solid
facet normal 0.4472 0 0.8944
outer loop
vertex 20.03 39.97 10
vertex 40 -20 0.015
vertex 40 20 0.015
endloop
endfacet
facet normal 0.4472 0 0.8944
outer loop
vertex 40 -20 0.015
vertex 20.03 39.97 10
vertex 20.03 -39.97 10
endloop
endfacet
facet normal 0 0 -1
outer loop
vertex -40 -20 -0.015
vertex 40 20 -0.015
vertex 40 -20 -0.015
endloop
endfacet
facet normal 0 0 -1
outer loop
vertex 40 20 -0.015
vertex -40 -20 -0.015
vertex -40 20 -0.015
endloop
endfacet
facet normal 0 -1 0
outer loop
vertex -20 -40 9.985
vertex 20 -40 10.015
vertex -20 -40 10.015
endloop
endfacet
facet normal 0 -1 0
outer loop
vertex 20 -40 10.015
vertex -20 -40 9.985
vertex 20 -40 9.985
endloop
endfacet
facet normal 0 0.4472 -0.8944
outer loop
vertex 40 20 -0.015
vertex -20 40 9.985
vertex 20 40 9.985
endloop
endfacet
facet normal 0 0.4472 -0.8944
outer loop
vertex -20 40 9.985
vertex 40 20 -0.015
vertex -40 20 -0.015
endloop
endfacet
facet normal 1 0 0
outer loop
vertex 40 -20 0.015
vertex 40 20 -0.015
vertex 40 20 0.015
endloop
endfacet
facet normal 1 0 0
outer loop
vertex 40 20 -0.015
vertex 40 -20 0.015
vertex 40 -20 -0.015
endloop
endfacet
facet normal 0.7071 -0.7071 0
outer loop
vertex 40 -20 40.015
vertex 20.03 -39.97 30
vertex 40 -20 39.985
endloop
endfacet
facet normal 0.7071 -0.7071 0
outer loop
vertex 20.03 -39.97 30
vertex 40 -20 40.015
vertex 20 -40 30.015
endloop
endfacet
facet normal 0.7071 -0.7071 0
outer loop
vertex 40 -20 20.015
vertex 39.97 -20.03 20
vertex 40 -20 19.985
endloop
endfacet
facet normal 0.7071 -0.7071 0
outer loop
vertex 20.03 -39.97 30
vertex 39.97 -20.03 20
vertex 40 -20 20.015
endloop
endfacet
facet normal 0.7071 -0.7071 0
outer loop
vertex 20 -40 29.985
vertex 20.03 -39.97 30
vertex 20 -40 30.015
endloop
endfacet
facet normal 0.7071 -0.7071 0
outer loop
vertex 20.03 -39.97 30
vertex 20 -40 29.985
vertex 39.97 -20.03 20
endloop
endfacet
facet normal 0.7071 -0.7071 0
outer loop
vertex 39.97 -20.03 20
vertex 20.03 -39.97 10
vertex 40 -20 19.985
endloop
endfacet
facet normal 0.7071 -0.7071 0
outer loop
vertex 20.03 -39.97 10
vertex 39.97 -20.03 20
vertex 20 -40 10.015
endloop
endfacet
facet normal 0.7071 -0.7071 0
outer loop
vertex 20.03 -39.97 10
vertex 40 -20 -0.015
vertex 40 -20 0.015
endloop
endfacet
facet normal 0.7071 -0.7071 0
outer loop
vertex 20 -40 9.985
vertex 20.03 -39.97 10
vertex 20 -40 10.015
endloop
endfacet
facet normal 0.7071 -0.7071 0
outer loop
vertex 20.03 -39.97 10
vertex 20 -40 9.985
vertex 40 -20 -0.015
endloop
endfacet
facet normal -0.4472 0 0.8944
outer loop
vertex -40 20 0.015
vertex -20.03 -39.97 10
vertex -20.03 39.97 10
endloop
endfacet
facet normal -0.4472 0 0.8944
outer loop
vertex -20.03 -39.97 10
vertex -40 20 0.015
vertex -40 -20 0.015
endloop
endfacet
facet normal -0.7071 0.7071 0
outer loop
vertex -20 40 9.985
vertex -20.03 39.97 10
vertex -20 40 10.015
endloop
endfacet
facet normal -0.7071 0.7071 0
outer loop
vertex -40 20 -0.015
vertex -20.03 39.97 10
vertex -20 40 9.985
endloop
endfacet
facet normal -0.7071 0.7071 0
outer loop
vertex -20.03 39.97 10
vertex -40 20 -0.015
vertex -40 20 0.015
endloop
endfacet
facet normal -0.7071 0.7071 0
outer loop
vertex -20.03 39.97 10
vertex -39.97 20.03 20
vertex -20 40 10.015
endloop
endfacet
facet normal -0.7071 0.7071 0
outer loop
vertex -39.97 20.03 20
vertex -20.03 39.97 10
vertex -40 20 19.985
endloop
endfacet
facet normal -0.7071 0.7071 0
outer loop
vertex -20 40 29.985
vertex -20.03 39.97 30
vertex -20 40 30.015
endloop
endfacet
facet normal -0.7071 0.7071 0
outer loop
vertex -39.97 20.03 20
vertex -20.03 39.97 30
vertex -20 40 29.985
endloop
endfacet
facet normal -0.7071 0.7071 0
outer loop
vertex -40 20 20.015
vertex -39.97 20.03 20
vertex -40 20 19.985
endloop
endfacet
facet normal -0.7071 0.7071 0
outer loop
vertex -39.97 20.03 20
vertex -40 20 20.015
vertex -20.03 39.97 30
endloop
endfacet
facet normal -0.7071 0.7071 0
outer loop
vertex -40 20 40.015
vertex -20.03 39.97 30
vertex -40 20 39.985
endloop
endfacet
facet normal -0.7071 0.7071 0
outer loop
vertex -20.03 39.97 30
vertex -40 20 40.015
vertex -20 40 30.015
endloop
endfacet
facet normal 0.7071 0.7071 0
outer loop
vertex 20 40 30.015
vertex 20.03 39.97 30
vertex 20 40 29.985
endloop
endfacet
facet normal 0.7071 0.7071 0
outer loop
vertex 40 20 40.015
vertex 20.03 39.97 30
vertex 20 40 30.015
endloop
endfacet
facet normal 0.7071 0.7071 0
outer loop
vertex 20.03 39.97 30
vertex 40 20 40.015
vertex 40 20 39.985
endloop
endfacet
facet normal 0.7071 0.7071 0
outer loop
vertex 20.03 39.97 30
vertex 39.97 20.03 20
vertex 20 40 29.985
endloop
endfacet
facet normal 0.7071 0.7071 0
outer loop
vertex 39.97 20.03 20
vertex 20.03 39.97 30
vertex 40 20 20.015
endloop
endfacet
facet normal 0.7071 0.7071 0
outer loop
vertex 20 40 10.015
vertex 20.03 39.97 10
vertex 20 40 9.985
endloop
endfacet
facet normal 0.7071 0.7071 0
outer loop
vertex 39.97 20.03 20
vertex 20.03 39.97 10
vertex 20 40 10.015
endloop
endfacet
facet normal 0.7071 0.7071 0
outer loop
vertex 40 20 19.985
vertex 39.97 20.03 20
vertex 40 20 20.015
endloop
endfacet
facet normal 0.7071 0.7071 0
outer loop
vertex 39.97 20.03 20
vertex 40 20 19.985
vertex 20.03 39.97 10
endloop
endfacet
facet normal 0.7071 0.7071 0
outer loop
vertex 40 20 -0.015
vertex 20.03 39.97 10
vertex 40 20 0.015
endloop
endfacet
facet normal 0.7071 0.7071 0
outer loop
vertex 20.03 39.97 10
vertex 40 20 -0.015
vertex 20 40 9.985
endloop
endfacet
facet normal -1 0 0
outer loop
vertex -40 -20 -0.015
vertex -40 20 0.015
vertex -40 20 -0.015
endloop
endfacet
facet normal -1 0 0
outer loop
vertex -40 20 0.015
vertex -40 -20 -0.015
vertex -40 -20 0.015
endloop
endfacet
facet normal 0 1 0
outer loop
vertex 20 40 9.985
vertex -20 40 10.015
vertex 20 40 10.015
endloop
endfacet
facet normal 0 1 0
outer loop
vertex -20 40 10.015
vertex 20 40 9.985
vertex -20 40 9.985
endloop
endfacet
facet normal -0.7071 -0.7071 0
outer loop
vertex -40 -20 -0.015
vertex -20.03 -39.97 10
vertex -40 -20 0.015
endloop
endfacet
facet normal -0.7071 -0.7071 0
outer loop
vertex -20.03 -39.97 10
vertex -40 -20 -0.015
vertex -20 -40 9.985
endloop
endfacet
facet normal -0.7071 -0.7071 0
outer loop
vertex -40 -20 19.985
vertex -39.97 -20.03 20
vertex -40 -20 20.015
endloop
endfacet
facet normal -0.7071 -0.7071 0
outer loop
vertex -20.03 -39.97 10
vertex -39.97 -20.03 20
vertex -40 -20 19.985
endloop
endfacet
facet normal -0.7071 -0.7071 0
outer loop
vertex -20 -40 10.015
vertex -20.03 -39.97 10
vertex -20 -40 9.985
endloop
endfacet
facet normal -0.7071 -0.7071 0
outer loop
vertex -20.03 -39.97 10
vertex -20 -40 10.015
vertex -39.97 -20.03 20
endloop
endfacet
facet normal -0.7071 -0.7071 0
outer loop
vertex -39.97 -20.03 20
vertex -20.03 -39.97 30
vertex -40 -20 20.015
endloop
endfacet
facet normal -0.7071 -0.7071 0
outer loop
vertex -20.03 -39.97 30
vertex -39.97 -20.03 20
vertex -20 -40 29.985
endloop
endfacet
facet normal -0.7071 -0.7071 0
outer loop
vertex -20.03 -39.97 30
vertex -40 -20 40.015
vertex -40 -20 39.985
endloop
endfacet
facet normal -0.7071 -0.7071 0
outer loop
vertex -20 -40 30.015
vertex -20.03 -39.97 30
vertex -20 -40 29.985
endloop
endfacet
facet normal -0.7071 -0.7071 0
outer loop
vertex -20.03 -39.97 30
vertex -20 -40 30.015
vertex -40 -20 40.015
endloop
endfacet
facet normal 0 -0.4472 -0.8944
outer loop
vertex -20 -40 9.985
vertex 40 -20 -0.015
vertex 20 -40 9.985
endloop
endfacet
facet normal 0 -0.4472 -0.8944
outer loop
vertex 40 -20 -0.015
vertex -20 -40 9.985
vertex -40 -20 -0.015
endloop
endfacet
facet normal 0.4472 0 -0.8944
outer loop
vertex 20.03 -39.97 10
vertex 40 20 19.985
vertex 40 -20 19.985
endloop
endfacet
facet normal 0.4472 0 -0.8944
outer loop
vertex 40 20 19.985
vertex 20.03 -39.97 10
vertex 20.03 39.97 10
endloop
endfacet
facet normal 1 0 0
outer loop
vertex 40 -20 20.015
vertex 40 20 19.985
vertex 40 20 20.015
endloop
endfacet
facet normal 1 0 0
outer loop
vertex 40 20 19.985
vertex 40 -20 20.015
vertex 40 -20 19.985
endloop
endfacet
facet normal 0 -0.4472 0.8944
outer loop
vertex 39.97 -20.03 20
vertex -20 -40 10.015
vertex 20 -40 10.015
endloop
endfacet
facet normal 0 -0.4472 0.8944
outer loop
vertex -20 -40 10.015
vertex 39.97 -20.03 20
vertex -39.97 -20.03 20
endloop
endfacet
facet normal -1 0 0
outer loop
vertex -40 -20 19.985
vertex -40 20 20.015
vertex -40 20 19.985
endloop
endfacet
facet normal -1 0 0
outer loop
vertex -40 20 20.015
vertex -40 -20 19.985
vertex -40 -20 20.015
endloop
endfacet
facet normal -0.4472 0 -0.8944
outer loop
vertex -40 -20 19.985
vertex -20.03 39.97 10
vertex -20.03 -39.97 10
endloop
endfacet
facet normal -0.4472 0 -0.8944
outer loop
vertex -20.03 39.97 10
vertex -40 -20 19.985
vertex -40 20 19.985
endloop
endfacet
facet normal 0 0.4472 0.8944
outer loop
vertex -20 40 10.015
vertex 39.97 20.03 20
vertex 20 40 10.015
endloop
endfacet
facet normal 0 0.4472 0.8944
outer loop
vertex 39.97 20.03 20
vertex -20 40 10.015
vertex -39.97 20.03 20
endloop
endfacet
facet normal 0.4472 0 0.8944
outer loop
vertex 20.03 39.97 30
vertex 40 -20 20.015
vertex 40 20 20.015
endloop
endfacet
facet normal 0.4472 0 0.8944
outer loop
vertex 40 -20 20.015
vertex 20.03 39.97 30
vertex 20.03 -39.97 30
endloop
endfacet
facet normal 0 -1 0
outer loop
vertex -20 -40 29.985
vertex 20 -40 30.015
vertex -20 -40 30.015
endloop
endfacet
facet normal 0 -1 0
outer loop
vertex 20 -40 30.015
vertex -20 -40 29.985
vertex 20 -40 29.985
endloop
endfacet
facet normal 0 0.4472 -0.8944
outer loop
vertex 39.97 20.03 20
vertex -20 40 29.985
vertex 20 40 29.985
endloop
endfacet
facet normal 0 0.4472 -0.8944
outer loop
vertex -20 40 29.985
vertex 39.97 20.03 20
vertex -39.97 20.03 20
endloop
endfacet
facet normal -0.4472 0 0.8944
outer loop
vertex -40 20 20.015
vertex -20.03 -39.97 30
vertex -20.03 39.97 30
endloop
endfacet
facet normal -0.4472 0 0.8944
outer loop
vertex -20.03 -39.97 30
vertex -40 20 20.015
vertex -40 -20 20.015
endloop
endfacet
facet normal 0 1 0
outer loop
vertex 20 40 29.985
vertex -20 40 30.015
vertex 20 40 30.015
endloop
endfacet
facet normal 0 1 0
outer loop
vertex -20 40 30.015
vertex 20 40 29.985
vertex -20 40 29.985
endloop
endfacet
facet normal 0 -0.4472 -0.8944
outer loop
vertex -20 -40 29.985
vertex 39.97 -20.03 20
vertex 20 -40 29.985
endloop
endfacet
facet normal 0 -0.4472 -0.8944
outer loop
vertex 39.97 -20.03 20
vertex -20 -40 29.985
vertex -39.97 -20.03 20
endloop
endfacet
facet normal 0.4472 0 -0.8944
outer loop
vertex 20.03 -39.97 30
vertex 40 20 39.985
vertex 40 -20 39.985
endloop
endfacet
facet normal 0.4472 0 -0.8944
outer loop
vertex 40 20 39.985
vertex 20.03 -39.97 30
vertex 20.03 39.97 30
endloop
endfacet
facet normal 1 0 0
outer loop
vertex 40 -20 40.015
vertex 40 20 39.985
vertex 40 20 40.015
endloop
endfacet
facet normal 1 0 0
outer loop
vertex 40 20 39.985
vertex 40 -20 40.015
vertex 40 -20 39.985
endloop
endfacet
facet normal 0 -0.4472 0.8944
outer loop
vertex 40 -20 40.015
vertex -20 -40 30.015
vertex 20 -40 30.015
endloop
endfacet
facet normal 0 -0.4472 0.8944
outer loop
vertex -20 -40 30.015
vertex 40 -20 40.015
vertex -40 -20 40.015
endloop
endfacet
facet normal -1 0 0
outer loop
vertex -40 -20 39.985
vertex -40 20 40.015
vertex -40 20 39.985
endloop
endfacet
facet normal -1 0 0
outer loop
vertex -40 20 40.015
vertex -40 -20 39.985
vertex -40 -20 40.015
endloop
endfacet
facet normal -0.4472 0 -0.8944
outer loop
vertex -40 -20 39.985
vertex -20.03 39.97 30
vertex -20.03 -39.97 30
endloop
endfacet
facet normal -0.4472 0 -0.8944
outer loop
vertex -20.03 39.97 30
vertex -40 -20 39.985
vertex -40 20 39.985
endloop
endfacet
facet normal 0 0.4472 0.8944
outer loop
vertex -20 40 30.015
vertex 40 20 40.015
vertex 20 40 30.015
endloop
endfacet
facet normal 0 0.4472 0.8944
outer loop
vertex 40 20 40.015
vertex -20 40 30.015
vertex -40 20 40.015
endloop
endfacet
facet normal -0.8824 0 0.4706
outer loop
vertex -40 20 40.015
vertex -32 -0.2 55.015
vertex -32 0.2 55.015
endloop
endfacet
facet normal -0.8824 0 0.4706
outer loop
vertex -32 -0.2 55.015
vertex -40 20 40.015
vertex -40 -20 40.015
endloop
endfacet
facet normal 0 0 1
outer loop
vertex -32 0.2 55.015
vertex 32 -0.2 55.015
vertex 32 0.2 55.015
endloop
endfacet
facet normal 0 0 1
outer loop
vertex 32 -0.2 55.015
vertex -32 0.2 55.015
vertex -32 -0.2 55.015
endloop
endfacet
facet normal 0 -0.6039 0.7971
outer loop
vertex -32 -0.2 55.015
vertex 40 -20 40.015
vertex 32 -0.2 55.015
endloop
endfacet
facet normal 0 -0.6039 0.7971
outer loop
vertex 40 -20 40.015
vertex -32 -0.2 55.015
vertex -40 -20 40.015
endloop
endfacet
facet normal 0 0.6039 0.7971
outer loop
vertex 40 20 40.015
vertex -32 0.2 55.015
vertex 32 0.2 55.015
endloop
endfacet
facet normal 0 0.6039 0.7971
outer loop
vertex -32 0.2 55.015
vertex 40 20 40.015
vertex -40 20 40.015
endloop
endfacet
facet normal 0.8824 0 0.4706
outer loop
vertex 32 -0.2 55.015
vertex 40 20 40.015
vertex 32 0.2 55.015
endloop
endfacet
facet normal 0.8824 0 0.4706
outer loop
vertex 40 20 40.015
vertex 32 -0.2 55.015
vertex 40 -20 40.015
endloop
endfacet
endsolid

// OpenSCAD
cylinder(40,20,20);
for(t=[0:20:30]){
translate([0,0,t])
{
hull(){
cube([80,40,.03],center=true);
translate([0,0,10])rotate(90)cube([80,40,.03],center=true);
}
translate([0,0,10])hull(){
translate([0,0,10])cube([80,40,.03],center=true);
rotate(90) cube([80,40,.03],center=true);
}}}

translate([0,0,30])hull(){
translate([0,0,10])cube([80,40,.03],center=true);
translate([0,0,25])scale(([.8,.01]))cube([80,40,.03],center=true);
}
